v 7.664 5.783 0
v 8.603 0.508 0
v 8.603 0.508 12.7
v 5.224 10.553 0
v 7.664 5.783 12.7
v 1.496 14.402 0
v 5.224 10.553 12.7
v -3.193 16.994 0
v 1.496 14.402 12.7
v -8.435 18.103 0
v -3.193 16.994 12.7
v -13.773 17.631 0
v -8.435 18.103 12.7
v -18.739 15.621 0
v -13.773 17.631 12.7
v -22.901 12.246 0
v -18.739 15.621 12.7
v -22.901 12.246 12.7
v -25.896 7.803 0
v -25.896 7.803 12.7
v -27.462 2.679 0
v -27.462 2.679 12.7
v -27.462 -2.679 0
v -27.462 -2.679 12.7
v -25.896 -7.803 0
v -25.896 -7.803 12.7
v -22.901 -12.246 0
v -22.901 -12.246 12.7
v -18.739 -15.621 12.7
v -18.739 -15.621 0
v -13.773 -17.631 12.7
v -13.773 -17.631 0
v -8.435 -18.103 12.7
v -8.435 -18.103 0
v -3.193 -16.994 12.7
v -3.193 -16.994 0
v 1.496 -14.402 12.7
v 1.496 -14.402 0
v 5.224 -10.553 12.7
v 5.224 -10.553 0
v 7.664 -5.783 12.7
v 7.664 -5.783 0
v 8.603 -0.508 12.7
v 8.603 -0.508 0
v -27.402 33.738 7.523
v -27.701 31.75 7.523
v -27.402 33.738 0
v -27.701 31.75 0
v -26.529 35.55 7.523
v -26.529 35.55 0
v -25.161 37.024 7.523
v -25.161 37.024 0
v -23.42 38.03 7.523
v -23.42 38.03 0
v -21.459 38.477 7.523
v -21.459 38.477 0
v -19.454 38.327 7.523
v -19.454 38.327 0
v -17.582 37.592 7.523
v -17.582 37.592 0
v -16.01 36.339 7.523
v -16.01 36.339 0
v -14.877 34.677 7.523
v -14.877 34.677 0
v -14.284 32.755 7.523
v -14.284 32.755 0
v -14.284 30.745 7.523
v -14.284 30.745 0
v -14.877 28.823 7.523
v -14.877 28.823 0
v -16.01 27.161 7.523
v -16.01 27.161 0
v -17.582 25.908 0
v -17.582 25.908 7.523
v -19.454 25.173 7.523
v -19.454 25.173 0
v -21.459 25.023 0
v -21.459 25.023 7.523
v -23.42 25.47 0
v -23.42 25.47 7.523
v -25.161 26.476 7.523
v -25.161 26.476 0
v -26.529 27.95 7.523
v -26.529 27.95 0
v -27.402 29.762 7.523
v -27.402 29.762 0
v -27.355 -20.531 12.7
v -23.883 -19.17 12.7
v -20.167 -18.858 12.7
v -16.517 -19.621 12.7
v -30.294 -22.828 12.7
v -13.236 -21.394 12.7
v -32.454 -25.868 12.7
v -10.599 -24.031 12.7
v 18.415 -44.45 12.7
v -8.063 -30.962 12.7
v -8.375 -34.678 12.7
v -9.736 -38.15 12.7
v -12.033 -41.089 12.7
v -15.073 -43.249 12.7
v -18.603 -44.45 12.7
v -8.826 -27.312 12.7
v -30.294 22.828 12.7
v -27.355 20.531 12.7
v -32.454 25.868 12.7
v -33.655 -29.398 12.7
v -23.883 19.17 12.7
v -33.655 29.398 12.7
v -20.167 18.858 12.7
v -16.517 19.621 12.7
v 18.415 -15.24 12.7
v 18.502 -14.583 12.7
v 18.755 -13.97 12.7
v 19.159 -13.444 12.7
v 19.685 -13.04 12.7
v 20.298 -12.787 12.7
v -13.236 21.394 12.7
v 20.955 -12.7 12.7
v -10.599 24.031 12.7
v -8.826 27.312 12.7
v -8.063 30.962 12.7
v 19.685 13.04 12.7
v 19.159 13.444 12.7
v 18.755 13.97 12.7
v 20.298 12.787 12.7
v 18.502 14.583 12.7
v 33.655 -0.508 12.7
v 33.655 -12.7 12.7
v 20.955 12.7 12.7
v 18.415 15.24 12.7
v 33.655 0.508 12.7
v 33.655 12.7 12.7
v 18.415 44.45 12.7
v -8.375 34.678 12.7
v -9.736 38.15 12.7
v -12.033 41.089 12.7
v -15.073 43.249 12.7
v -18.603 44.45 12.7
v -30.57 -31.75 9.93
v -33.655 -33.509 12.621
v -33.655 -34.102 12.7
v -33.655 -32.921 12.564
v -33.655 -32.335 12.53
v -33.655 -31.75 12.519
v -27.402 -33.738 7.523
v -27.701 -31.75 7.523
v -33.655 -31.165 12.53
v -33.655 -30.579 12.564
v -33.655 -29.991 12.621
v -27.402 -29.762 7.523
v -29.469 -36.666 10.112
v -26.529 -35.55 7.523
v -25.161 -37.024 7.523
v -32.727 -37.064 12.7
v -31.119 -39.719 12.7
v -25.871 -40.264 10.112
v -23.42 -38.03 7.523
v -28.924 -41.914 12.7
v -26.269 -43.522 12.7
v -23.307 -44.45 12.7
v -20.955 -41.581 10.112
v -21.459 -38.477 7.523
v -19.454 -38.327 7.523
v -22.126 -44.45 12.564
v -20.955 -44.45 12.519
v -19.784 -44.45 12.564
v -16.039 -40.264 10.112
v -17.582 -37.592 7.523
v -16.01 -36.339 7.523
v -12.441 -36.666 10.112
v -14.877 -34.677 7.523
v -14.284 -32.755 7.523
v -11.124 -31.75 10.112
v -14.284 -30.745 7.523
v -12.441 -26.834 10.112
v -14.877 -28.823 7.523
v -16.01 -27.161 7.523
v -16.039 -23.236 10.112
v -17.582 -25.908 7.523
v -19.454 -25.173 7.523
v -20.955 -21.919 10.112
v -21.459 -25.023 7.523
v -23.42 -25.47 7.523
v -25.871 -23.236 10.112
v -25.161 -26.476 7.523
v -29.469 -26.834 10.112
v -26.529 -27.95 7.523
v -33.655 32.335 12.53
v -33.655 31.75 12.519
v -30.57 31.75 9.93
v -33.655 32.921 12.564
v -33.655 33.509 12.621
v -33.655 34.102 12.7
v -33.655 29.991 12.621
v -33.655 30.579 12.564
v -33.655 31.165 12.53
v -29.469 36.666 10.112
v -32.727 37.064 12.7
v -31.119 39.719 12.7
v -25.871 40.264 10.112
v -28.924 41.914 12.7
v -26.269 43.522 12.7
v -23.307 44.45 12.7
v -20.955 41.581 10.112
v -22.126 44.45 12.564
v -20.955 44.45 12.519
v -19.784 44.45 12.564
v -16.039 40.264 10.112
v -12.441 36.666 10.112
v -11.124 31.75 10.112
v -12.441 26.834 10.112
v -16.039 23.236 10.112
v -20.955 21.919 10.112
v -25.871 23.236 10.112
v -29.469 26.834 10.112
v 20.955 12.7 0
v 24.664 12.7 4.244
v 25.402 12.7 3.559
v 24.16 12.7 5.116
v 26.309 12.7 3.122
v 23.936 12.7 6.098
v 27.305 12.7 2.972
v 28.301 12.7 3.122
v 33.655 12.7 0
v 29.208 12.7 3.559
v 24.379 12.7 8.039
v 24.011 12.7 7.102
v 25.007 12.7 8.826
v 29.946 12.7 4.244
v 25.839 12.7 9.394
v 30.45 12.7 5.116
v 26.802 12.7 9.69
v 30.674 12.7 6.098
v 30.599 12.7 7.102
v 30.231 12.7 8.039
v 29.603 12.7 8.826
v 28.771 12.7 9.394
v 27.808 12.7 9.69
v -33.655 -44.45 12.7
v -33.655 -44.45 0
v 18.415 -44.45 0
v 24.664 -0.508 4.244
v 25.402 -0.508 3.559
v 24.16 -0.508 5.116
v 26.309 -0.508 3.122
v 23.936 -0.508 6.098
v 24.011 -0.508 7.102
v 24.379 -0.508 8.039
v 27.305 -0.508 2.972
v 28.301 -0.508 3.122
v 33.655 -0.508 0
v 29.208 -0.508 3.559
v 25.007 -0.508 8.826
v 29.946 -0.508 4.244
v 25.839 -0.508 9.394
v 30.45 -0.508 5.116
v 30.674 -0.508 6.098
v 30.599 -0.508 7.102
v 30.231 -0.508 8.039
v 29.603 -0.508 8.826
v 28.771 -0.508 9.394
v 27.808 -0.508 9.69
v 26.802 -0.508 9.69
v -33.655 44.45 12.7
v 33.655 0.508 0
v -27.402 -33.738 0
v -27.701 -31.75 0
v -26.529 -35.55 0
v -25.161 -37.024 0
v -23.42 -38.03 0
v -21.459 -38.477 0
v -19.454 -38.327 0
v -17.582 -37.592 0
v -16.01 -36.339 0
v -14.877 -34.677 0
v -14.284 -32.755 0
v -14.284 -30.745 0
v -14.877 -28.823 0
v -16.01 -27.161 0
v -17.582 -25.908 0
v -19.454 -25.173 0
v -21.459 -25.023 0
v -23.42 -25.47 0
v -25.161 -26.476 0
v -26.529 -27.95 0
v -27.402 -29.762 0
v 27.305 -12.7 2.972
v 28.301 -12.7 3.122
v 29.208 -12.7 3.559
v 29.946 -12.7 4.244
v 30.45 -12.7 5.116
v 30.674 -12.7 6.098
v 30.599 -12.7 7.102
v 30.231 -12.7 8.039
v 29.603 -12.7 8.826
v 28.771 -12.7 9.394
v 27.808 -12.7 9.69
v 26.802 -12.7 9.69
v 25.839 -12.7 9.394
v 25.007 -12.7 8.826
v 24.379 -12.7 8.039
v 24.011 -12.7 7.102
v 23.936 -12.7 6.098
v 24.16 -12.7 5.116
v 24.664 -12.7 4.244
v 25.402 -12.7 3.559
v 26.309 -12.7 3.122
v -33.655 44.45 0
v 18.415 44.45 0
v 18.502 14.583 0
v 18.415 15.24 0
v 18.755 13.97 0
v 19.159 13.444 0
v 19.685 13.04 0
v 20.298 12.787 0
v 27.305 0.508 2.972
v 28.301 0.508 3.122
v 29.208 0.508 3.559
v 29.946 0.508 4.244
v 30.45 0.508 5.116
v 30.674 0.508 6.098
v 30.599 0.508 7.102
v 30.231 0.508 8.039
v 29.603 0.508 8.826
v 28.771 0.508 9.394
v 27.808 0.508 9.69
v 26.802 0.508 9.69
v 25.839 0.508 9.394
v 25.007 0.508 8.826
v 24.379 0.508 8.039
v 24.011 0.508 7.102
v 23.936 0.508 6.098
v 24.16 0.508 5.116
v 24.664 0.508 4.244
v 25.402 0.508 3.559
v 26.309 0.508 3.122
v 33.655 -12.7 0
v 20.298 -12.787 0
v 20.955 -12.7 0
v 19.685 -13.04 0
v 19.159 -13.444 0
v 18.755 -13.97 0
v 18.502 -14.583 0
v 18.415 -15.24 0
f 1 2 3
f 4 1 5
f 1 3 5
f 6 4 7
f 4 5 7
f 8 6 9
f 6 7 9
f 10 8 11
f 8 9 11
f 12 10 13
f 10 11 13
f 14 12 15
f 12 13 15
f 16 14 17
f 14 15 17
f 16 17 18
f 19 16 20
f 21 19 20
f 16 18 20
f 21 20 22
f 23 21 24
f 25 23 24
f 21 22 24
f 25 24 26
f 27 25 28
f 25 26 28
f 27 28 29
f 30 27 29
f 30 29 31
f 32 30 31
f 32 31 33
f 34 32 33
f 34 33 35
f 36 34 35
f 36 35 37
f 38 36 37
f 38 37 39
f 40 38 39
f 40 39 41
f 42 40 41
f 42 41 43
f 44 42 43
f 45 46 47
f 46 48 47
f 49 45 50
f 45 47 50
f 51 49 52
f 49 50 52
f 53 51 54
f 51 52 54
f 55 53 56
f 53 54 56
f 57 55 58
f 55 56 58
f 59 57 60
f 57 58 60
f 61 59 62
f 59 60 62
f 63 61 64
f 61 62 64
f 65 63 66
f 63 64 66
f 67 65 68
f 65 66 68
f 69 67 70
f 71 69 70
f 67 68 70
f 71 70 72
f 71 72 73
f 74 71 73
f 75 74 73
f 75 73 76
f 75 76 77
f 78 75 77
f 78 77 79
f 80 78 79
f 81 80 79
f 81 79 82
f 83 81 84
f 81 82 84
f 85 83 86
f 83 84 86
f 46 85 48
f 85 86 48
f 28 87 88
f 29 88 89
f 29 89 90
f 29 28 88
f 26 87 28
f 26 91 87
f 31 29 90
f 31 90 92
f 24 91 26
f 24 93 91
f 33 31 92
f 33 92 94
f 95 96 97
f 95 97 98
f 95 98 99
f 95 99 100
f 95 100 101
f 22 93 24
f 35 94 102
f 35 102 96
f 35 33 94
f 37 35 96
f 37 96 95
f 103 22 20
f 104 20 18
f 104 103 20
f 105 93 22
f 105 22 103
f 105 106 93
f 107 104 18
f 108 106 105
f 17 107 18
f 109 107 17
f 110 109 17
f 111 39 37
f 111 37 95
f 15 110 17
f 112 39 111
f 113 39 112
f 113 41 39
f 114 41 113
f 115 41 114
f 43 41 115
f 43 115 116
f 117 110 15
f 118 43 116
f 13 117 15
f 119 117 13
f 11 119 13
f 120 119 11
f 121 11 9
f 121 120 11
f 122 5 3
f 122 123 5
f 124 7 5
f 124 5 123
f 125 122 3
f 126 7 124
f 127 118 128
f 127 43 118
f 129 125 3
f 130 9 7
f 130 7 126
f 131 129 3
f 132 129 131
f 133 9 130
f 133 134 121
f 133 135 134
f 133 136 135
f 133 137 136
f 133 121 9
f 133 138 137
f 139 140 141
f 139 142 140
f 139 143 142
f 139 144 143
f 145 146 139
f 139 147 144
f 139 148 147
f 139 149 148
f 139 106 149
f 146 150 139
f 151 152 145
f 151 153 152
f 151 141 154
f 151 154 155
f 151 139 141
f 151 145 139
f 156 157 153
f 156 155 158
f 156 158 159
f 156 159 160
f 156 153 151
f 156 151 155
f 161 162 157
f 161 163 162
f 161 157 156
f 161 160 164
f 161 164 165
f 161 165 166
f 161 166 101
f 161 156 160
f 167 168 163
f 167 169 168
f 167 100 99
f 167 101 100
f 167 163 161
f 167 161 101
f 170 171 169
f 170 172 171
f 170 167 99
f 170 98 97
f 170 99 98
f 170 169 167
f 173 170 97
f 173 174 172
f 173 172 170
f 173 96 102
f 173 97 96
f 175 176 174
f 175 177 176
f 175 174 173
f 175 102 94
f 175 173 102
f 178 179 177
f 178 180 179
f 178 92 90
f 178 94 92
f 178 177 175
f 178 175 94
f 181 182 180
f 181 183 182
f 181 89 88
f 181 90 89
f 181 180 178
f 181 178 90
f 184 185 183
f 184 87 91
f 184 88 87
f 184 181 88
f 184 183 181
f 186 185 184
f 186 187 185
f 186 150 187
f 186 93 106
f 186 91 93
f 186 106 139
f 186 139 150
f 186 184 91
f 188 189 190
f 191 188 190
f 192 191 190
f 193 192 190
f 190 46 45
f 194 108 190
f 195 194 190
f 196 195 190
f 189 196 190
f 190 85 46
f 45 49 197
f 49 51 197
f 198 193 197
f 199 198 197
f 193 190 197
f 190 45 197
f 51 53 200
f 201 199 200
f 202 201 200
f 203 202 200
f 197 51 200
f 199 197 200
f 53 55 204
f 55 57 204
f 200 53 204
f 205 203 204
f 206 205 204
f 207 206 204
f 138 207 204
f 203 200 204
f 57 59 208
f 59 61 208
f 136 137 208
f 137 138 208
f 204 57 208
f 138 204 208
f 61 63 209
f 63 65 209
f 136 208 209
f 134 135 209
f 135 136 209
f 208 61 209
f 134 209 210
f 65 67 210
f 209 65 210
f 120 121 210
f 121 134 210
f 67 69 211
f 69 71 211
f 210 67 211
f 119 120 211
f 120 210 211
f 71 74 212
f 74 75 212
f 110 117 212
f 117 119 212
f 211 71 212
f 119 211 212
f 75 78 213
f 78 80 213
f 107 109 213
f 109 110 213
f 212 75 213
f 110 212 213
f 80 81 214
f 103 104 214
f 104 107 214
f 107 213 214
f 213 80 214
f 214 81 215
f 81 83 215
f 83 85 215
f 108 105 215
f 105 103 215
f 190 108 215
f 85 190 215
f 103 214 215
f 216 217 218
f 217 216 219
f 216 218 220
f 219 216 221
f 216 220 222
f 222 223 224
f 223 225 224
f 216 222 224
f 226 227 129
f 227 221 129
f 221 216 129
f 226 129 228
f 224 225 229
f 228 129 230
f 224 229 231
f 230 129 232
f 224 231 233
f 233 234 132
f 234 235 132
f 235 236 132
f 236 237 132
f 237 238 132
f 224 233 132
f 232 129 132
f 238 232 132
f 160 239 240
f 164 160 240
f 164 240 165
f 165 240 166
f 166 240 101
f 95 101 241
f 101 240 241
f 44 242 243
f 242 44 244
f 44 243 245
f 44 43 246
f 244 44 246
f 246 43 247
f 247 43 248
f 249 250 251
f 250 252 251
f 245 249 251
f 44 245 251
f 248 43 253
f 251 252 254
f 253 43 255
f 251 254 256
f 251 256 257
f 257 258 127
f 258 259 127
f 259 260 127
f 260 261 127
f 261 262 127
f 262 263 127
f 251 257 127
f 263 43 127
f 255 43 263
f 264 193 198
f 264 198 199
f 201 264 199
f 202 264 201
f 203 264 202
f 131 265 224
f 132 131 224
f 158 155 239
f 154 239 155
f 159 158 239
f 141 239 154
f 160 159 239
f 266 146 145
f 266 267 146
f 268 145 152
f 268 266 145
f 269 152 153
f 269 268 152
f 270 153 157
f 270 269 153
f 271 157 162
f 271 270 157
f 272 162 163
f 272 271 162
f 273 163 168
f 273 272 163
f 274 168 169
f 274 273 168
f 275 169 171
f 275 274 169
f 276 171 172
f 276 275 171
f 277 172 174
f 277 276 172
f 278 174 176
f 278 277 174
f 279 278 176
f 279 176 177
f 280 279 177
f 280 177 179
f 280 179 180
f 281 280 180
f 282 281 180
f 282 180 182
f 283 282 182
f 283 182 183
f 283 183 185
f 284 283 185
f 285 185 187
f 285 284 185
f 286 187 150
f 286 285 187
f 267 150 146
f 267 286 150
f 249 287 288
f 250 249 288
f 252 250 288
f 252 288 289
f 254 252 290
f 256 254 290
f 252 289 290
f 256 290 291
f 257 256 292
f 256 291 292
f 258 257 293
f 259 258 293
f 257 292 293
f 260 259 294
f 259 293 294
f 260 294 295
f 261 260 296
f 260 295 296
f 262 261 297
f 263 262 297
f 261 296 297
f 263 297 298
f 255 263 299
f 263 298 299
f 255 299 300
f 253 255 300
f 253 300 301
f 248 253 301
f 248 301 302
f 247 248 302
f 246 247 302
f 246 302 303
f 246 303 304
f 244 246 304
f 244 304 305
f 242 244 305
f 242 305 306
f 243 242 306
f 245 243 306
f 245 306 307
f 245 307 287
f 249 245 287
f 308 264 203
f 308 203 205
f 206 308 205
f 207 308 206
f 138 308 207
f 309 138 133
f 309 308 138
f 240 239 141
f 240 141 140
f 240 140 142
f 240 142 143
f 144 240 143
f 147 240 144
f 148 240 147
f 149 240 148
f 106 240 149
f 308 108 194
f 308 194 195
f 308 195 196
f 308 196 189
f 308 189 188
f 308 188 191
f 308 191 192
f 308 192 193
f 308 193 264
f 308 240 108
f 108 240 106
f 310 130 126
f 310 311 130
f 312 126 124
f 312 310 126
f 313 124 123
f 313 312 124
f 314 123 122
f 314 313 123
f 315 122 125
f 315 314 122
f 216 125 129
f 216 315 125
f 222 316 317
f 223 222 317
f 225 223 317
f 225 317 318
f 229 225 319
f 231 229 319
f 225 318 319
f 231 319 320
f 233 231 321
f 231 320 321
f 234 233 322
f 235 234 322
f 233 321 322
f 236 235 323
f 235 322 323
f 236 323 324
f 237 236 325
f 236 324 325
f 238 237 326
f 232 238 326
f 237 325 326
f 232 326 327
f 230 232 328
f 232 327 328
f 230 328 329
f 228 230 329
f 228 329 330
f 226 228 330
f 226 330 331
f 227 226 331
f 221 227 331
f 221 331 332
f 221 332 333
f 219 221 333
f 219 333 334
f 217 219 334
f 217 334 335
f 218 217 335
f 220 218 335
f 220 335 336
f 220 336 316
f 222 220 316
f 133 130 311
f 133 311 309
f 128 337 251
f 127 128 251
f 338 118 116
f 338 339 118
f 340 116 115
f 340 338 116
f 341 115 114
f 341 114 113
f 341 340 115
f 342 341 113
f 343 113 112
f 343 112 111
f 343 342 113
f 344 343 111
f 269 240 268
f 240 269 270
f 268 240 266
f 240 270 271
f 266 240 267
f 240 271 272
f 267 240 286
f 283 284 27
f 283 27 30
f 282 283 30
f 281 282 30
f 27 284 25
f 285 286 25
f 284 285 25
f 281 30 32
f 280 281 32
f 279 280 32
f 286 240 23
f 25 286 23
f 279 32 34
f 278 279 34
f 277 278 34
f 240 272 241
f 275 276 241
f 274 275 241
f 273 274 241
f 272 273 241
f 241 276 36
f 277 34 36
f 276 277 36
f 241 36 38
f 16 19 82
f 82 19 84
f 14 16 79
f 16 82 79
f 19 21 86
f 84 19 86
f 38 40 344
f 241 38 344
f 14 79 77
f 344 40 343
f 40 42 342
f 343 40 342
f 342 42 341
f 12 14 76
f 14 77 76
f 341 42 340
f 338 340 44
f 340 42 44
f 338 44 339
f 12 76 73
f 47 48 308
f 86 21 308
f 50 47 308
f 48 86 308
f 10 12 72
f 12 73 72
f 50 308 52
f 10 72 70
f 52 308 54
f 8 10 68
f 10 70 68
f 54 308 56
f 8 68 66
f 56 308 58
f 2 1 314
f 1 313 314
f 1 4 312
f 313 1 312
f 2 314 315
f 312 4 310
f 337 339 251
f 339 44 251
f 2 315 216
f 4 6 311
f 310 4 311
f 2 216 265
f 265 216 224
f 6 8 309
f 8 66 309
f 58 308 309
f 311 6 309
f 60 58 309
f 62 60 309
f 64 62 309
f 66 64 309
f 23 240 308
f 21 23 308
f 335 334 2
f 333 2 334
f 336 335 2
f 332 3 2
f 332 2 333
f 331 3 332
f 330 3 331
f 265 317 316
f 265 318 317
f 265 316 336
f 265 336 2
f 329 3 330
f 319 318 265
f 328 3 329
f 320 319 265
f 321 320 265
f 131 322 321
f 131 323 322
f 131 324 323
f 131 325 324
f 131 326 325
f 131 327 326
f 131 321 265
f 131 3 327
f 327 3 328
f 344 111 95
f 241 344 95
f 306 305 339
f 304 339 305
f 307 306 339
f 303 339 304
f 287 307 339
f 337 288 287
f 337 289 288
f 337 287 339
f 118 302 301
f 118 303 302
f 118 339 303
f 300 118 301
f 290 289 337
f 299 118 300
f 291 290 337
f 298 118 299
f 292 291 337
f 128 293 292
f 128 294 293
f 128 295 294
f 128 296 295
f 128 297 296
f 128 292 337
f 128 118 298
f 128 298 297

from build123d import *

# Parameters (mm, degrees)
SKETCH1_W                                           = 67.31
SKETCH1_H                                           = 88.9
EXTRUDE1_DEPTH                                      = 12.7
SKETCH2_R                                           = 18.1356
EXTRUDE2_DEPTH                                      = 13.7
SKETCH3_W                                           = 28.468633454
SKETCH3_H                                           = 1.016
EXTRUDE3_DEPTH                                      = 13.7
F_1_4_CLEARANCE_HOLE1_D                             = 6.7564
CSK_FOR_1_2_FLAT_HEAD_MACHINE_SCREW_100_D           = 13.49248
CSK_FOR_1_2_FLAT_HEAD_MACHINE_SCREW_100_CSINK_D     = 25.8318
CSK_FOR_1_2_FLAT_HEAD_MACHINE_SCREW_100_CSINK_ANGLE = 100
SKETCH10_W                                          = 15.24
SKETCH10_H                                          = 31.75
EXTRUDE4_DEPTH                                      = 13.7
FILLET1_R                                           = 2.54
FILLET1_OF_MIRROR2_R                                = 2.54


with BuildPart() as part:
    # Sketch1 → Extrude1 (new body)
    with BuildSketch(Plane.XY):
        Rectangle(SKETCH1_W, SKETCH1_H)
    extrude(amount=EXTRUDE1_DEPTH)

    # Sketch2 → Extrude2 (cut, through all)
    with BuildSketch(Plane.XY.offset(12.7)):
        with Locations((-9.525, 0)):
            Circle(SKETCH2_R)
    extrude(amount=-EXTRUDE2_DEPTH, mode=Mode.SUBTRACT)

    # Sketch3 → Extrude3 (cut, through all)
    with BuildSketch(Plane.XY.offset(12.7)):
        with Locations((21.1328, 0)):
            Rectangle(SKETCH3_W, SKETCH3_H)
    extrude(amount=-EXTRUDE3_DEPTH, mode=Mode.SUBTRACT)

    # 1/4 Clearance Hole1 (through all)
    with Locations(Plane(origin=(27.305, 44.45, 6.35), x_dir=(0, 0, 1), z_dir=(0, 1, 0))):
        with Locations((0, 0)):
            Hole(F_1_4_CLEARANCE_HOLE1_D / 2)

    # CSK for 1/2 Flat Head Machine Screw (100)1 (through all)
    with Locations(Plane(origin=(-20.955, 31.75, 12.7), x_dir=(1, 0, 0), z_dir=(0, 0, 1))):
        with Locations((0, 0)):
            csk_for_1_2_flat_head_machine_screw_100 = CounterSinkHole(CSK_FOR_1_2_FLAT_HEAD_MACHINE_SCREW_100_D / 2, CSK_FOR_1_2_FLAT_HEAD_MACHINE_SCREW_100_CSINK_D / 2, counter_sink_angle=CSK_FOR_1_2_FLAT_HEAD_MACHINE_SCREW_100_CSINK_ANGLE)

    # Mirror1: CSK for 1/2 Flat Head Machine Screw (100)1 across plane
    add(csk_for_1_2_flat_head_machine_screw_100.mirror(Plane.ZX), mode=Mode.SUBTRACT)

    # Sketch10 → Extrude4 (cut, through all)
    with BuildSketch(Plane.XY.offset(12.7)):
        with Locations((26.035, 28.575)):
            Rectangle(SKETCH10_W, SKETCH10_H)
    extrude4 = extrude(amount=-EXTRUDE4_DEPTH, mode=Mode.SUBTRACT)

    # Fillet1
    fillet1_edges = [part.edges().sort_by_distance(p)[0] for p in [
        (18.415, 12.7, 6.35),
    ]]
    fillet(fillet1_edges, radius=FILLET1_R)

    # Mirror2: Extrude4 across plane
    add(extrude4.mirror(Plane.ZX), mode=Mode.SUBTRACT)

    # Fillet1 of Mirror2
    fillet1_of_mirror2_edges = [part.edges().sort_by_distance(p)[0] for p in [
        (18.415, -12.7, 6.35),
    ]]
    fillet(fillet1_of_mirror2_edges, radius=FILLET1_OF_MIRROR2_R)


solid = part.part
